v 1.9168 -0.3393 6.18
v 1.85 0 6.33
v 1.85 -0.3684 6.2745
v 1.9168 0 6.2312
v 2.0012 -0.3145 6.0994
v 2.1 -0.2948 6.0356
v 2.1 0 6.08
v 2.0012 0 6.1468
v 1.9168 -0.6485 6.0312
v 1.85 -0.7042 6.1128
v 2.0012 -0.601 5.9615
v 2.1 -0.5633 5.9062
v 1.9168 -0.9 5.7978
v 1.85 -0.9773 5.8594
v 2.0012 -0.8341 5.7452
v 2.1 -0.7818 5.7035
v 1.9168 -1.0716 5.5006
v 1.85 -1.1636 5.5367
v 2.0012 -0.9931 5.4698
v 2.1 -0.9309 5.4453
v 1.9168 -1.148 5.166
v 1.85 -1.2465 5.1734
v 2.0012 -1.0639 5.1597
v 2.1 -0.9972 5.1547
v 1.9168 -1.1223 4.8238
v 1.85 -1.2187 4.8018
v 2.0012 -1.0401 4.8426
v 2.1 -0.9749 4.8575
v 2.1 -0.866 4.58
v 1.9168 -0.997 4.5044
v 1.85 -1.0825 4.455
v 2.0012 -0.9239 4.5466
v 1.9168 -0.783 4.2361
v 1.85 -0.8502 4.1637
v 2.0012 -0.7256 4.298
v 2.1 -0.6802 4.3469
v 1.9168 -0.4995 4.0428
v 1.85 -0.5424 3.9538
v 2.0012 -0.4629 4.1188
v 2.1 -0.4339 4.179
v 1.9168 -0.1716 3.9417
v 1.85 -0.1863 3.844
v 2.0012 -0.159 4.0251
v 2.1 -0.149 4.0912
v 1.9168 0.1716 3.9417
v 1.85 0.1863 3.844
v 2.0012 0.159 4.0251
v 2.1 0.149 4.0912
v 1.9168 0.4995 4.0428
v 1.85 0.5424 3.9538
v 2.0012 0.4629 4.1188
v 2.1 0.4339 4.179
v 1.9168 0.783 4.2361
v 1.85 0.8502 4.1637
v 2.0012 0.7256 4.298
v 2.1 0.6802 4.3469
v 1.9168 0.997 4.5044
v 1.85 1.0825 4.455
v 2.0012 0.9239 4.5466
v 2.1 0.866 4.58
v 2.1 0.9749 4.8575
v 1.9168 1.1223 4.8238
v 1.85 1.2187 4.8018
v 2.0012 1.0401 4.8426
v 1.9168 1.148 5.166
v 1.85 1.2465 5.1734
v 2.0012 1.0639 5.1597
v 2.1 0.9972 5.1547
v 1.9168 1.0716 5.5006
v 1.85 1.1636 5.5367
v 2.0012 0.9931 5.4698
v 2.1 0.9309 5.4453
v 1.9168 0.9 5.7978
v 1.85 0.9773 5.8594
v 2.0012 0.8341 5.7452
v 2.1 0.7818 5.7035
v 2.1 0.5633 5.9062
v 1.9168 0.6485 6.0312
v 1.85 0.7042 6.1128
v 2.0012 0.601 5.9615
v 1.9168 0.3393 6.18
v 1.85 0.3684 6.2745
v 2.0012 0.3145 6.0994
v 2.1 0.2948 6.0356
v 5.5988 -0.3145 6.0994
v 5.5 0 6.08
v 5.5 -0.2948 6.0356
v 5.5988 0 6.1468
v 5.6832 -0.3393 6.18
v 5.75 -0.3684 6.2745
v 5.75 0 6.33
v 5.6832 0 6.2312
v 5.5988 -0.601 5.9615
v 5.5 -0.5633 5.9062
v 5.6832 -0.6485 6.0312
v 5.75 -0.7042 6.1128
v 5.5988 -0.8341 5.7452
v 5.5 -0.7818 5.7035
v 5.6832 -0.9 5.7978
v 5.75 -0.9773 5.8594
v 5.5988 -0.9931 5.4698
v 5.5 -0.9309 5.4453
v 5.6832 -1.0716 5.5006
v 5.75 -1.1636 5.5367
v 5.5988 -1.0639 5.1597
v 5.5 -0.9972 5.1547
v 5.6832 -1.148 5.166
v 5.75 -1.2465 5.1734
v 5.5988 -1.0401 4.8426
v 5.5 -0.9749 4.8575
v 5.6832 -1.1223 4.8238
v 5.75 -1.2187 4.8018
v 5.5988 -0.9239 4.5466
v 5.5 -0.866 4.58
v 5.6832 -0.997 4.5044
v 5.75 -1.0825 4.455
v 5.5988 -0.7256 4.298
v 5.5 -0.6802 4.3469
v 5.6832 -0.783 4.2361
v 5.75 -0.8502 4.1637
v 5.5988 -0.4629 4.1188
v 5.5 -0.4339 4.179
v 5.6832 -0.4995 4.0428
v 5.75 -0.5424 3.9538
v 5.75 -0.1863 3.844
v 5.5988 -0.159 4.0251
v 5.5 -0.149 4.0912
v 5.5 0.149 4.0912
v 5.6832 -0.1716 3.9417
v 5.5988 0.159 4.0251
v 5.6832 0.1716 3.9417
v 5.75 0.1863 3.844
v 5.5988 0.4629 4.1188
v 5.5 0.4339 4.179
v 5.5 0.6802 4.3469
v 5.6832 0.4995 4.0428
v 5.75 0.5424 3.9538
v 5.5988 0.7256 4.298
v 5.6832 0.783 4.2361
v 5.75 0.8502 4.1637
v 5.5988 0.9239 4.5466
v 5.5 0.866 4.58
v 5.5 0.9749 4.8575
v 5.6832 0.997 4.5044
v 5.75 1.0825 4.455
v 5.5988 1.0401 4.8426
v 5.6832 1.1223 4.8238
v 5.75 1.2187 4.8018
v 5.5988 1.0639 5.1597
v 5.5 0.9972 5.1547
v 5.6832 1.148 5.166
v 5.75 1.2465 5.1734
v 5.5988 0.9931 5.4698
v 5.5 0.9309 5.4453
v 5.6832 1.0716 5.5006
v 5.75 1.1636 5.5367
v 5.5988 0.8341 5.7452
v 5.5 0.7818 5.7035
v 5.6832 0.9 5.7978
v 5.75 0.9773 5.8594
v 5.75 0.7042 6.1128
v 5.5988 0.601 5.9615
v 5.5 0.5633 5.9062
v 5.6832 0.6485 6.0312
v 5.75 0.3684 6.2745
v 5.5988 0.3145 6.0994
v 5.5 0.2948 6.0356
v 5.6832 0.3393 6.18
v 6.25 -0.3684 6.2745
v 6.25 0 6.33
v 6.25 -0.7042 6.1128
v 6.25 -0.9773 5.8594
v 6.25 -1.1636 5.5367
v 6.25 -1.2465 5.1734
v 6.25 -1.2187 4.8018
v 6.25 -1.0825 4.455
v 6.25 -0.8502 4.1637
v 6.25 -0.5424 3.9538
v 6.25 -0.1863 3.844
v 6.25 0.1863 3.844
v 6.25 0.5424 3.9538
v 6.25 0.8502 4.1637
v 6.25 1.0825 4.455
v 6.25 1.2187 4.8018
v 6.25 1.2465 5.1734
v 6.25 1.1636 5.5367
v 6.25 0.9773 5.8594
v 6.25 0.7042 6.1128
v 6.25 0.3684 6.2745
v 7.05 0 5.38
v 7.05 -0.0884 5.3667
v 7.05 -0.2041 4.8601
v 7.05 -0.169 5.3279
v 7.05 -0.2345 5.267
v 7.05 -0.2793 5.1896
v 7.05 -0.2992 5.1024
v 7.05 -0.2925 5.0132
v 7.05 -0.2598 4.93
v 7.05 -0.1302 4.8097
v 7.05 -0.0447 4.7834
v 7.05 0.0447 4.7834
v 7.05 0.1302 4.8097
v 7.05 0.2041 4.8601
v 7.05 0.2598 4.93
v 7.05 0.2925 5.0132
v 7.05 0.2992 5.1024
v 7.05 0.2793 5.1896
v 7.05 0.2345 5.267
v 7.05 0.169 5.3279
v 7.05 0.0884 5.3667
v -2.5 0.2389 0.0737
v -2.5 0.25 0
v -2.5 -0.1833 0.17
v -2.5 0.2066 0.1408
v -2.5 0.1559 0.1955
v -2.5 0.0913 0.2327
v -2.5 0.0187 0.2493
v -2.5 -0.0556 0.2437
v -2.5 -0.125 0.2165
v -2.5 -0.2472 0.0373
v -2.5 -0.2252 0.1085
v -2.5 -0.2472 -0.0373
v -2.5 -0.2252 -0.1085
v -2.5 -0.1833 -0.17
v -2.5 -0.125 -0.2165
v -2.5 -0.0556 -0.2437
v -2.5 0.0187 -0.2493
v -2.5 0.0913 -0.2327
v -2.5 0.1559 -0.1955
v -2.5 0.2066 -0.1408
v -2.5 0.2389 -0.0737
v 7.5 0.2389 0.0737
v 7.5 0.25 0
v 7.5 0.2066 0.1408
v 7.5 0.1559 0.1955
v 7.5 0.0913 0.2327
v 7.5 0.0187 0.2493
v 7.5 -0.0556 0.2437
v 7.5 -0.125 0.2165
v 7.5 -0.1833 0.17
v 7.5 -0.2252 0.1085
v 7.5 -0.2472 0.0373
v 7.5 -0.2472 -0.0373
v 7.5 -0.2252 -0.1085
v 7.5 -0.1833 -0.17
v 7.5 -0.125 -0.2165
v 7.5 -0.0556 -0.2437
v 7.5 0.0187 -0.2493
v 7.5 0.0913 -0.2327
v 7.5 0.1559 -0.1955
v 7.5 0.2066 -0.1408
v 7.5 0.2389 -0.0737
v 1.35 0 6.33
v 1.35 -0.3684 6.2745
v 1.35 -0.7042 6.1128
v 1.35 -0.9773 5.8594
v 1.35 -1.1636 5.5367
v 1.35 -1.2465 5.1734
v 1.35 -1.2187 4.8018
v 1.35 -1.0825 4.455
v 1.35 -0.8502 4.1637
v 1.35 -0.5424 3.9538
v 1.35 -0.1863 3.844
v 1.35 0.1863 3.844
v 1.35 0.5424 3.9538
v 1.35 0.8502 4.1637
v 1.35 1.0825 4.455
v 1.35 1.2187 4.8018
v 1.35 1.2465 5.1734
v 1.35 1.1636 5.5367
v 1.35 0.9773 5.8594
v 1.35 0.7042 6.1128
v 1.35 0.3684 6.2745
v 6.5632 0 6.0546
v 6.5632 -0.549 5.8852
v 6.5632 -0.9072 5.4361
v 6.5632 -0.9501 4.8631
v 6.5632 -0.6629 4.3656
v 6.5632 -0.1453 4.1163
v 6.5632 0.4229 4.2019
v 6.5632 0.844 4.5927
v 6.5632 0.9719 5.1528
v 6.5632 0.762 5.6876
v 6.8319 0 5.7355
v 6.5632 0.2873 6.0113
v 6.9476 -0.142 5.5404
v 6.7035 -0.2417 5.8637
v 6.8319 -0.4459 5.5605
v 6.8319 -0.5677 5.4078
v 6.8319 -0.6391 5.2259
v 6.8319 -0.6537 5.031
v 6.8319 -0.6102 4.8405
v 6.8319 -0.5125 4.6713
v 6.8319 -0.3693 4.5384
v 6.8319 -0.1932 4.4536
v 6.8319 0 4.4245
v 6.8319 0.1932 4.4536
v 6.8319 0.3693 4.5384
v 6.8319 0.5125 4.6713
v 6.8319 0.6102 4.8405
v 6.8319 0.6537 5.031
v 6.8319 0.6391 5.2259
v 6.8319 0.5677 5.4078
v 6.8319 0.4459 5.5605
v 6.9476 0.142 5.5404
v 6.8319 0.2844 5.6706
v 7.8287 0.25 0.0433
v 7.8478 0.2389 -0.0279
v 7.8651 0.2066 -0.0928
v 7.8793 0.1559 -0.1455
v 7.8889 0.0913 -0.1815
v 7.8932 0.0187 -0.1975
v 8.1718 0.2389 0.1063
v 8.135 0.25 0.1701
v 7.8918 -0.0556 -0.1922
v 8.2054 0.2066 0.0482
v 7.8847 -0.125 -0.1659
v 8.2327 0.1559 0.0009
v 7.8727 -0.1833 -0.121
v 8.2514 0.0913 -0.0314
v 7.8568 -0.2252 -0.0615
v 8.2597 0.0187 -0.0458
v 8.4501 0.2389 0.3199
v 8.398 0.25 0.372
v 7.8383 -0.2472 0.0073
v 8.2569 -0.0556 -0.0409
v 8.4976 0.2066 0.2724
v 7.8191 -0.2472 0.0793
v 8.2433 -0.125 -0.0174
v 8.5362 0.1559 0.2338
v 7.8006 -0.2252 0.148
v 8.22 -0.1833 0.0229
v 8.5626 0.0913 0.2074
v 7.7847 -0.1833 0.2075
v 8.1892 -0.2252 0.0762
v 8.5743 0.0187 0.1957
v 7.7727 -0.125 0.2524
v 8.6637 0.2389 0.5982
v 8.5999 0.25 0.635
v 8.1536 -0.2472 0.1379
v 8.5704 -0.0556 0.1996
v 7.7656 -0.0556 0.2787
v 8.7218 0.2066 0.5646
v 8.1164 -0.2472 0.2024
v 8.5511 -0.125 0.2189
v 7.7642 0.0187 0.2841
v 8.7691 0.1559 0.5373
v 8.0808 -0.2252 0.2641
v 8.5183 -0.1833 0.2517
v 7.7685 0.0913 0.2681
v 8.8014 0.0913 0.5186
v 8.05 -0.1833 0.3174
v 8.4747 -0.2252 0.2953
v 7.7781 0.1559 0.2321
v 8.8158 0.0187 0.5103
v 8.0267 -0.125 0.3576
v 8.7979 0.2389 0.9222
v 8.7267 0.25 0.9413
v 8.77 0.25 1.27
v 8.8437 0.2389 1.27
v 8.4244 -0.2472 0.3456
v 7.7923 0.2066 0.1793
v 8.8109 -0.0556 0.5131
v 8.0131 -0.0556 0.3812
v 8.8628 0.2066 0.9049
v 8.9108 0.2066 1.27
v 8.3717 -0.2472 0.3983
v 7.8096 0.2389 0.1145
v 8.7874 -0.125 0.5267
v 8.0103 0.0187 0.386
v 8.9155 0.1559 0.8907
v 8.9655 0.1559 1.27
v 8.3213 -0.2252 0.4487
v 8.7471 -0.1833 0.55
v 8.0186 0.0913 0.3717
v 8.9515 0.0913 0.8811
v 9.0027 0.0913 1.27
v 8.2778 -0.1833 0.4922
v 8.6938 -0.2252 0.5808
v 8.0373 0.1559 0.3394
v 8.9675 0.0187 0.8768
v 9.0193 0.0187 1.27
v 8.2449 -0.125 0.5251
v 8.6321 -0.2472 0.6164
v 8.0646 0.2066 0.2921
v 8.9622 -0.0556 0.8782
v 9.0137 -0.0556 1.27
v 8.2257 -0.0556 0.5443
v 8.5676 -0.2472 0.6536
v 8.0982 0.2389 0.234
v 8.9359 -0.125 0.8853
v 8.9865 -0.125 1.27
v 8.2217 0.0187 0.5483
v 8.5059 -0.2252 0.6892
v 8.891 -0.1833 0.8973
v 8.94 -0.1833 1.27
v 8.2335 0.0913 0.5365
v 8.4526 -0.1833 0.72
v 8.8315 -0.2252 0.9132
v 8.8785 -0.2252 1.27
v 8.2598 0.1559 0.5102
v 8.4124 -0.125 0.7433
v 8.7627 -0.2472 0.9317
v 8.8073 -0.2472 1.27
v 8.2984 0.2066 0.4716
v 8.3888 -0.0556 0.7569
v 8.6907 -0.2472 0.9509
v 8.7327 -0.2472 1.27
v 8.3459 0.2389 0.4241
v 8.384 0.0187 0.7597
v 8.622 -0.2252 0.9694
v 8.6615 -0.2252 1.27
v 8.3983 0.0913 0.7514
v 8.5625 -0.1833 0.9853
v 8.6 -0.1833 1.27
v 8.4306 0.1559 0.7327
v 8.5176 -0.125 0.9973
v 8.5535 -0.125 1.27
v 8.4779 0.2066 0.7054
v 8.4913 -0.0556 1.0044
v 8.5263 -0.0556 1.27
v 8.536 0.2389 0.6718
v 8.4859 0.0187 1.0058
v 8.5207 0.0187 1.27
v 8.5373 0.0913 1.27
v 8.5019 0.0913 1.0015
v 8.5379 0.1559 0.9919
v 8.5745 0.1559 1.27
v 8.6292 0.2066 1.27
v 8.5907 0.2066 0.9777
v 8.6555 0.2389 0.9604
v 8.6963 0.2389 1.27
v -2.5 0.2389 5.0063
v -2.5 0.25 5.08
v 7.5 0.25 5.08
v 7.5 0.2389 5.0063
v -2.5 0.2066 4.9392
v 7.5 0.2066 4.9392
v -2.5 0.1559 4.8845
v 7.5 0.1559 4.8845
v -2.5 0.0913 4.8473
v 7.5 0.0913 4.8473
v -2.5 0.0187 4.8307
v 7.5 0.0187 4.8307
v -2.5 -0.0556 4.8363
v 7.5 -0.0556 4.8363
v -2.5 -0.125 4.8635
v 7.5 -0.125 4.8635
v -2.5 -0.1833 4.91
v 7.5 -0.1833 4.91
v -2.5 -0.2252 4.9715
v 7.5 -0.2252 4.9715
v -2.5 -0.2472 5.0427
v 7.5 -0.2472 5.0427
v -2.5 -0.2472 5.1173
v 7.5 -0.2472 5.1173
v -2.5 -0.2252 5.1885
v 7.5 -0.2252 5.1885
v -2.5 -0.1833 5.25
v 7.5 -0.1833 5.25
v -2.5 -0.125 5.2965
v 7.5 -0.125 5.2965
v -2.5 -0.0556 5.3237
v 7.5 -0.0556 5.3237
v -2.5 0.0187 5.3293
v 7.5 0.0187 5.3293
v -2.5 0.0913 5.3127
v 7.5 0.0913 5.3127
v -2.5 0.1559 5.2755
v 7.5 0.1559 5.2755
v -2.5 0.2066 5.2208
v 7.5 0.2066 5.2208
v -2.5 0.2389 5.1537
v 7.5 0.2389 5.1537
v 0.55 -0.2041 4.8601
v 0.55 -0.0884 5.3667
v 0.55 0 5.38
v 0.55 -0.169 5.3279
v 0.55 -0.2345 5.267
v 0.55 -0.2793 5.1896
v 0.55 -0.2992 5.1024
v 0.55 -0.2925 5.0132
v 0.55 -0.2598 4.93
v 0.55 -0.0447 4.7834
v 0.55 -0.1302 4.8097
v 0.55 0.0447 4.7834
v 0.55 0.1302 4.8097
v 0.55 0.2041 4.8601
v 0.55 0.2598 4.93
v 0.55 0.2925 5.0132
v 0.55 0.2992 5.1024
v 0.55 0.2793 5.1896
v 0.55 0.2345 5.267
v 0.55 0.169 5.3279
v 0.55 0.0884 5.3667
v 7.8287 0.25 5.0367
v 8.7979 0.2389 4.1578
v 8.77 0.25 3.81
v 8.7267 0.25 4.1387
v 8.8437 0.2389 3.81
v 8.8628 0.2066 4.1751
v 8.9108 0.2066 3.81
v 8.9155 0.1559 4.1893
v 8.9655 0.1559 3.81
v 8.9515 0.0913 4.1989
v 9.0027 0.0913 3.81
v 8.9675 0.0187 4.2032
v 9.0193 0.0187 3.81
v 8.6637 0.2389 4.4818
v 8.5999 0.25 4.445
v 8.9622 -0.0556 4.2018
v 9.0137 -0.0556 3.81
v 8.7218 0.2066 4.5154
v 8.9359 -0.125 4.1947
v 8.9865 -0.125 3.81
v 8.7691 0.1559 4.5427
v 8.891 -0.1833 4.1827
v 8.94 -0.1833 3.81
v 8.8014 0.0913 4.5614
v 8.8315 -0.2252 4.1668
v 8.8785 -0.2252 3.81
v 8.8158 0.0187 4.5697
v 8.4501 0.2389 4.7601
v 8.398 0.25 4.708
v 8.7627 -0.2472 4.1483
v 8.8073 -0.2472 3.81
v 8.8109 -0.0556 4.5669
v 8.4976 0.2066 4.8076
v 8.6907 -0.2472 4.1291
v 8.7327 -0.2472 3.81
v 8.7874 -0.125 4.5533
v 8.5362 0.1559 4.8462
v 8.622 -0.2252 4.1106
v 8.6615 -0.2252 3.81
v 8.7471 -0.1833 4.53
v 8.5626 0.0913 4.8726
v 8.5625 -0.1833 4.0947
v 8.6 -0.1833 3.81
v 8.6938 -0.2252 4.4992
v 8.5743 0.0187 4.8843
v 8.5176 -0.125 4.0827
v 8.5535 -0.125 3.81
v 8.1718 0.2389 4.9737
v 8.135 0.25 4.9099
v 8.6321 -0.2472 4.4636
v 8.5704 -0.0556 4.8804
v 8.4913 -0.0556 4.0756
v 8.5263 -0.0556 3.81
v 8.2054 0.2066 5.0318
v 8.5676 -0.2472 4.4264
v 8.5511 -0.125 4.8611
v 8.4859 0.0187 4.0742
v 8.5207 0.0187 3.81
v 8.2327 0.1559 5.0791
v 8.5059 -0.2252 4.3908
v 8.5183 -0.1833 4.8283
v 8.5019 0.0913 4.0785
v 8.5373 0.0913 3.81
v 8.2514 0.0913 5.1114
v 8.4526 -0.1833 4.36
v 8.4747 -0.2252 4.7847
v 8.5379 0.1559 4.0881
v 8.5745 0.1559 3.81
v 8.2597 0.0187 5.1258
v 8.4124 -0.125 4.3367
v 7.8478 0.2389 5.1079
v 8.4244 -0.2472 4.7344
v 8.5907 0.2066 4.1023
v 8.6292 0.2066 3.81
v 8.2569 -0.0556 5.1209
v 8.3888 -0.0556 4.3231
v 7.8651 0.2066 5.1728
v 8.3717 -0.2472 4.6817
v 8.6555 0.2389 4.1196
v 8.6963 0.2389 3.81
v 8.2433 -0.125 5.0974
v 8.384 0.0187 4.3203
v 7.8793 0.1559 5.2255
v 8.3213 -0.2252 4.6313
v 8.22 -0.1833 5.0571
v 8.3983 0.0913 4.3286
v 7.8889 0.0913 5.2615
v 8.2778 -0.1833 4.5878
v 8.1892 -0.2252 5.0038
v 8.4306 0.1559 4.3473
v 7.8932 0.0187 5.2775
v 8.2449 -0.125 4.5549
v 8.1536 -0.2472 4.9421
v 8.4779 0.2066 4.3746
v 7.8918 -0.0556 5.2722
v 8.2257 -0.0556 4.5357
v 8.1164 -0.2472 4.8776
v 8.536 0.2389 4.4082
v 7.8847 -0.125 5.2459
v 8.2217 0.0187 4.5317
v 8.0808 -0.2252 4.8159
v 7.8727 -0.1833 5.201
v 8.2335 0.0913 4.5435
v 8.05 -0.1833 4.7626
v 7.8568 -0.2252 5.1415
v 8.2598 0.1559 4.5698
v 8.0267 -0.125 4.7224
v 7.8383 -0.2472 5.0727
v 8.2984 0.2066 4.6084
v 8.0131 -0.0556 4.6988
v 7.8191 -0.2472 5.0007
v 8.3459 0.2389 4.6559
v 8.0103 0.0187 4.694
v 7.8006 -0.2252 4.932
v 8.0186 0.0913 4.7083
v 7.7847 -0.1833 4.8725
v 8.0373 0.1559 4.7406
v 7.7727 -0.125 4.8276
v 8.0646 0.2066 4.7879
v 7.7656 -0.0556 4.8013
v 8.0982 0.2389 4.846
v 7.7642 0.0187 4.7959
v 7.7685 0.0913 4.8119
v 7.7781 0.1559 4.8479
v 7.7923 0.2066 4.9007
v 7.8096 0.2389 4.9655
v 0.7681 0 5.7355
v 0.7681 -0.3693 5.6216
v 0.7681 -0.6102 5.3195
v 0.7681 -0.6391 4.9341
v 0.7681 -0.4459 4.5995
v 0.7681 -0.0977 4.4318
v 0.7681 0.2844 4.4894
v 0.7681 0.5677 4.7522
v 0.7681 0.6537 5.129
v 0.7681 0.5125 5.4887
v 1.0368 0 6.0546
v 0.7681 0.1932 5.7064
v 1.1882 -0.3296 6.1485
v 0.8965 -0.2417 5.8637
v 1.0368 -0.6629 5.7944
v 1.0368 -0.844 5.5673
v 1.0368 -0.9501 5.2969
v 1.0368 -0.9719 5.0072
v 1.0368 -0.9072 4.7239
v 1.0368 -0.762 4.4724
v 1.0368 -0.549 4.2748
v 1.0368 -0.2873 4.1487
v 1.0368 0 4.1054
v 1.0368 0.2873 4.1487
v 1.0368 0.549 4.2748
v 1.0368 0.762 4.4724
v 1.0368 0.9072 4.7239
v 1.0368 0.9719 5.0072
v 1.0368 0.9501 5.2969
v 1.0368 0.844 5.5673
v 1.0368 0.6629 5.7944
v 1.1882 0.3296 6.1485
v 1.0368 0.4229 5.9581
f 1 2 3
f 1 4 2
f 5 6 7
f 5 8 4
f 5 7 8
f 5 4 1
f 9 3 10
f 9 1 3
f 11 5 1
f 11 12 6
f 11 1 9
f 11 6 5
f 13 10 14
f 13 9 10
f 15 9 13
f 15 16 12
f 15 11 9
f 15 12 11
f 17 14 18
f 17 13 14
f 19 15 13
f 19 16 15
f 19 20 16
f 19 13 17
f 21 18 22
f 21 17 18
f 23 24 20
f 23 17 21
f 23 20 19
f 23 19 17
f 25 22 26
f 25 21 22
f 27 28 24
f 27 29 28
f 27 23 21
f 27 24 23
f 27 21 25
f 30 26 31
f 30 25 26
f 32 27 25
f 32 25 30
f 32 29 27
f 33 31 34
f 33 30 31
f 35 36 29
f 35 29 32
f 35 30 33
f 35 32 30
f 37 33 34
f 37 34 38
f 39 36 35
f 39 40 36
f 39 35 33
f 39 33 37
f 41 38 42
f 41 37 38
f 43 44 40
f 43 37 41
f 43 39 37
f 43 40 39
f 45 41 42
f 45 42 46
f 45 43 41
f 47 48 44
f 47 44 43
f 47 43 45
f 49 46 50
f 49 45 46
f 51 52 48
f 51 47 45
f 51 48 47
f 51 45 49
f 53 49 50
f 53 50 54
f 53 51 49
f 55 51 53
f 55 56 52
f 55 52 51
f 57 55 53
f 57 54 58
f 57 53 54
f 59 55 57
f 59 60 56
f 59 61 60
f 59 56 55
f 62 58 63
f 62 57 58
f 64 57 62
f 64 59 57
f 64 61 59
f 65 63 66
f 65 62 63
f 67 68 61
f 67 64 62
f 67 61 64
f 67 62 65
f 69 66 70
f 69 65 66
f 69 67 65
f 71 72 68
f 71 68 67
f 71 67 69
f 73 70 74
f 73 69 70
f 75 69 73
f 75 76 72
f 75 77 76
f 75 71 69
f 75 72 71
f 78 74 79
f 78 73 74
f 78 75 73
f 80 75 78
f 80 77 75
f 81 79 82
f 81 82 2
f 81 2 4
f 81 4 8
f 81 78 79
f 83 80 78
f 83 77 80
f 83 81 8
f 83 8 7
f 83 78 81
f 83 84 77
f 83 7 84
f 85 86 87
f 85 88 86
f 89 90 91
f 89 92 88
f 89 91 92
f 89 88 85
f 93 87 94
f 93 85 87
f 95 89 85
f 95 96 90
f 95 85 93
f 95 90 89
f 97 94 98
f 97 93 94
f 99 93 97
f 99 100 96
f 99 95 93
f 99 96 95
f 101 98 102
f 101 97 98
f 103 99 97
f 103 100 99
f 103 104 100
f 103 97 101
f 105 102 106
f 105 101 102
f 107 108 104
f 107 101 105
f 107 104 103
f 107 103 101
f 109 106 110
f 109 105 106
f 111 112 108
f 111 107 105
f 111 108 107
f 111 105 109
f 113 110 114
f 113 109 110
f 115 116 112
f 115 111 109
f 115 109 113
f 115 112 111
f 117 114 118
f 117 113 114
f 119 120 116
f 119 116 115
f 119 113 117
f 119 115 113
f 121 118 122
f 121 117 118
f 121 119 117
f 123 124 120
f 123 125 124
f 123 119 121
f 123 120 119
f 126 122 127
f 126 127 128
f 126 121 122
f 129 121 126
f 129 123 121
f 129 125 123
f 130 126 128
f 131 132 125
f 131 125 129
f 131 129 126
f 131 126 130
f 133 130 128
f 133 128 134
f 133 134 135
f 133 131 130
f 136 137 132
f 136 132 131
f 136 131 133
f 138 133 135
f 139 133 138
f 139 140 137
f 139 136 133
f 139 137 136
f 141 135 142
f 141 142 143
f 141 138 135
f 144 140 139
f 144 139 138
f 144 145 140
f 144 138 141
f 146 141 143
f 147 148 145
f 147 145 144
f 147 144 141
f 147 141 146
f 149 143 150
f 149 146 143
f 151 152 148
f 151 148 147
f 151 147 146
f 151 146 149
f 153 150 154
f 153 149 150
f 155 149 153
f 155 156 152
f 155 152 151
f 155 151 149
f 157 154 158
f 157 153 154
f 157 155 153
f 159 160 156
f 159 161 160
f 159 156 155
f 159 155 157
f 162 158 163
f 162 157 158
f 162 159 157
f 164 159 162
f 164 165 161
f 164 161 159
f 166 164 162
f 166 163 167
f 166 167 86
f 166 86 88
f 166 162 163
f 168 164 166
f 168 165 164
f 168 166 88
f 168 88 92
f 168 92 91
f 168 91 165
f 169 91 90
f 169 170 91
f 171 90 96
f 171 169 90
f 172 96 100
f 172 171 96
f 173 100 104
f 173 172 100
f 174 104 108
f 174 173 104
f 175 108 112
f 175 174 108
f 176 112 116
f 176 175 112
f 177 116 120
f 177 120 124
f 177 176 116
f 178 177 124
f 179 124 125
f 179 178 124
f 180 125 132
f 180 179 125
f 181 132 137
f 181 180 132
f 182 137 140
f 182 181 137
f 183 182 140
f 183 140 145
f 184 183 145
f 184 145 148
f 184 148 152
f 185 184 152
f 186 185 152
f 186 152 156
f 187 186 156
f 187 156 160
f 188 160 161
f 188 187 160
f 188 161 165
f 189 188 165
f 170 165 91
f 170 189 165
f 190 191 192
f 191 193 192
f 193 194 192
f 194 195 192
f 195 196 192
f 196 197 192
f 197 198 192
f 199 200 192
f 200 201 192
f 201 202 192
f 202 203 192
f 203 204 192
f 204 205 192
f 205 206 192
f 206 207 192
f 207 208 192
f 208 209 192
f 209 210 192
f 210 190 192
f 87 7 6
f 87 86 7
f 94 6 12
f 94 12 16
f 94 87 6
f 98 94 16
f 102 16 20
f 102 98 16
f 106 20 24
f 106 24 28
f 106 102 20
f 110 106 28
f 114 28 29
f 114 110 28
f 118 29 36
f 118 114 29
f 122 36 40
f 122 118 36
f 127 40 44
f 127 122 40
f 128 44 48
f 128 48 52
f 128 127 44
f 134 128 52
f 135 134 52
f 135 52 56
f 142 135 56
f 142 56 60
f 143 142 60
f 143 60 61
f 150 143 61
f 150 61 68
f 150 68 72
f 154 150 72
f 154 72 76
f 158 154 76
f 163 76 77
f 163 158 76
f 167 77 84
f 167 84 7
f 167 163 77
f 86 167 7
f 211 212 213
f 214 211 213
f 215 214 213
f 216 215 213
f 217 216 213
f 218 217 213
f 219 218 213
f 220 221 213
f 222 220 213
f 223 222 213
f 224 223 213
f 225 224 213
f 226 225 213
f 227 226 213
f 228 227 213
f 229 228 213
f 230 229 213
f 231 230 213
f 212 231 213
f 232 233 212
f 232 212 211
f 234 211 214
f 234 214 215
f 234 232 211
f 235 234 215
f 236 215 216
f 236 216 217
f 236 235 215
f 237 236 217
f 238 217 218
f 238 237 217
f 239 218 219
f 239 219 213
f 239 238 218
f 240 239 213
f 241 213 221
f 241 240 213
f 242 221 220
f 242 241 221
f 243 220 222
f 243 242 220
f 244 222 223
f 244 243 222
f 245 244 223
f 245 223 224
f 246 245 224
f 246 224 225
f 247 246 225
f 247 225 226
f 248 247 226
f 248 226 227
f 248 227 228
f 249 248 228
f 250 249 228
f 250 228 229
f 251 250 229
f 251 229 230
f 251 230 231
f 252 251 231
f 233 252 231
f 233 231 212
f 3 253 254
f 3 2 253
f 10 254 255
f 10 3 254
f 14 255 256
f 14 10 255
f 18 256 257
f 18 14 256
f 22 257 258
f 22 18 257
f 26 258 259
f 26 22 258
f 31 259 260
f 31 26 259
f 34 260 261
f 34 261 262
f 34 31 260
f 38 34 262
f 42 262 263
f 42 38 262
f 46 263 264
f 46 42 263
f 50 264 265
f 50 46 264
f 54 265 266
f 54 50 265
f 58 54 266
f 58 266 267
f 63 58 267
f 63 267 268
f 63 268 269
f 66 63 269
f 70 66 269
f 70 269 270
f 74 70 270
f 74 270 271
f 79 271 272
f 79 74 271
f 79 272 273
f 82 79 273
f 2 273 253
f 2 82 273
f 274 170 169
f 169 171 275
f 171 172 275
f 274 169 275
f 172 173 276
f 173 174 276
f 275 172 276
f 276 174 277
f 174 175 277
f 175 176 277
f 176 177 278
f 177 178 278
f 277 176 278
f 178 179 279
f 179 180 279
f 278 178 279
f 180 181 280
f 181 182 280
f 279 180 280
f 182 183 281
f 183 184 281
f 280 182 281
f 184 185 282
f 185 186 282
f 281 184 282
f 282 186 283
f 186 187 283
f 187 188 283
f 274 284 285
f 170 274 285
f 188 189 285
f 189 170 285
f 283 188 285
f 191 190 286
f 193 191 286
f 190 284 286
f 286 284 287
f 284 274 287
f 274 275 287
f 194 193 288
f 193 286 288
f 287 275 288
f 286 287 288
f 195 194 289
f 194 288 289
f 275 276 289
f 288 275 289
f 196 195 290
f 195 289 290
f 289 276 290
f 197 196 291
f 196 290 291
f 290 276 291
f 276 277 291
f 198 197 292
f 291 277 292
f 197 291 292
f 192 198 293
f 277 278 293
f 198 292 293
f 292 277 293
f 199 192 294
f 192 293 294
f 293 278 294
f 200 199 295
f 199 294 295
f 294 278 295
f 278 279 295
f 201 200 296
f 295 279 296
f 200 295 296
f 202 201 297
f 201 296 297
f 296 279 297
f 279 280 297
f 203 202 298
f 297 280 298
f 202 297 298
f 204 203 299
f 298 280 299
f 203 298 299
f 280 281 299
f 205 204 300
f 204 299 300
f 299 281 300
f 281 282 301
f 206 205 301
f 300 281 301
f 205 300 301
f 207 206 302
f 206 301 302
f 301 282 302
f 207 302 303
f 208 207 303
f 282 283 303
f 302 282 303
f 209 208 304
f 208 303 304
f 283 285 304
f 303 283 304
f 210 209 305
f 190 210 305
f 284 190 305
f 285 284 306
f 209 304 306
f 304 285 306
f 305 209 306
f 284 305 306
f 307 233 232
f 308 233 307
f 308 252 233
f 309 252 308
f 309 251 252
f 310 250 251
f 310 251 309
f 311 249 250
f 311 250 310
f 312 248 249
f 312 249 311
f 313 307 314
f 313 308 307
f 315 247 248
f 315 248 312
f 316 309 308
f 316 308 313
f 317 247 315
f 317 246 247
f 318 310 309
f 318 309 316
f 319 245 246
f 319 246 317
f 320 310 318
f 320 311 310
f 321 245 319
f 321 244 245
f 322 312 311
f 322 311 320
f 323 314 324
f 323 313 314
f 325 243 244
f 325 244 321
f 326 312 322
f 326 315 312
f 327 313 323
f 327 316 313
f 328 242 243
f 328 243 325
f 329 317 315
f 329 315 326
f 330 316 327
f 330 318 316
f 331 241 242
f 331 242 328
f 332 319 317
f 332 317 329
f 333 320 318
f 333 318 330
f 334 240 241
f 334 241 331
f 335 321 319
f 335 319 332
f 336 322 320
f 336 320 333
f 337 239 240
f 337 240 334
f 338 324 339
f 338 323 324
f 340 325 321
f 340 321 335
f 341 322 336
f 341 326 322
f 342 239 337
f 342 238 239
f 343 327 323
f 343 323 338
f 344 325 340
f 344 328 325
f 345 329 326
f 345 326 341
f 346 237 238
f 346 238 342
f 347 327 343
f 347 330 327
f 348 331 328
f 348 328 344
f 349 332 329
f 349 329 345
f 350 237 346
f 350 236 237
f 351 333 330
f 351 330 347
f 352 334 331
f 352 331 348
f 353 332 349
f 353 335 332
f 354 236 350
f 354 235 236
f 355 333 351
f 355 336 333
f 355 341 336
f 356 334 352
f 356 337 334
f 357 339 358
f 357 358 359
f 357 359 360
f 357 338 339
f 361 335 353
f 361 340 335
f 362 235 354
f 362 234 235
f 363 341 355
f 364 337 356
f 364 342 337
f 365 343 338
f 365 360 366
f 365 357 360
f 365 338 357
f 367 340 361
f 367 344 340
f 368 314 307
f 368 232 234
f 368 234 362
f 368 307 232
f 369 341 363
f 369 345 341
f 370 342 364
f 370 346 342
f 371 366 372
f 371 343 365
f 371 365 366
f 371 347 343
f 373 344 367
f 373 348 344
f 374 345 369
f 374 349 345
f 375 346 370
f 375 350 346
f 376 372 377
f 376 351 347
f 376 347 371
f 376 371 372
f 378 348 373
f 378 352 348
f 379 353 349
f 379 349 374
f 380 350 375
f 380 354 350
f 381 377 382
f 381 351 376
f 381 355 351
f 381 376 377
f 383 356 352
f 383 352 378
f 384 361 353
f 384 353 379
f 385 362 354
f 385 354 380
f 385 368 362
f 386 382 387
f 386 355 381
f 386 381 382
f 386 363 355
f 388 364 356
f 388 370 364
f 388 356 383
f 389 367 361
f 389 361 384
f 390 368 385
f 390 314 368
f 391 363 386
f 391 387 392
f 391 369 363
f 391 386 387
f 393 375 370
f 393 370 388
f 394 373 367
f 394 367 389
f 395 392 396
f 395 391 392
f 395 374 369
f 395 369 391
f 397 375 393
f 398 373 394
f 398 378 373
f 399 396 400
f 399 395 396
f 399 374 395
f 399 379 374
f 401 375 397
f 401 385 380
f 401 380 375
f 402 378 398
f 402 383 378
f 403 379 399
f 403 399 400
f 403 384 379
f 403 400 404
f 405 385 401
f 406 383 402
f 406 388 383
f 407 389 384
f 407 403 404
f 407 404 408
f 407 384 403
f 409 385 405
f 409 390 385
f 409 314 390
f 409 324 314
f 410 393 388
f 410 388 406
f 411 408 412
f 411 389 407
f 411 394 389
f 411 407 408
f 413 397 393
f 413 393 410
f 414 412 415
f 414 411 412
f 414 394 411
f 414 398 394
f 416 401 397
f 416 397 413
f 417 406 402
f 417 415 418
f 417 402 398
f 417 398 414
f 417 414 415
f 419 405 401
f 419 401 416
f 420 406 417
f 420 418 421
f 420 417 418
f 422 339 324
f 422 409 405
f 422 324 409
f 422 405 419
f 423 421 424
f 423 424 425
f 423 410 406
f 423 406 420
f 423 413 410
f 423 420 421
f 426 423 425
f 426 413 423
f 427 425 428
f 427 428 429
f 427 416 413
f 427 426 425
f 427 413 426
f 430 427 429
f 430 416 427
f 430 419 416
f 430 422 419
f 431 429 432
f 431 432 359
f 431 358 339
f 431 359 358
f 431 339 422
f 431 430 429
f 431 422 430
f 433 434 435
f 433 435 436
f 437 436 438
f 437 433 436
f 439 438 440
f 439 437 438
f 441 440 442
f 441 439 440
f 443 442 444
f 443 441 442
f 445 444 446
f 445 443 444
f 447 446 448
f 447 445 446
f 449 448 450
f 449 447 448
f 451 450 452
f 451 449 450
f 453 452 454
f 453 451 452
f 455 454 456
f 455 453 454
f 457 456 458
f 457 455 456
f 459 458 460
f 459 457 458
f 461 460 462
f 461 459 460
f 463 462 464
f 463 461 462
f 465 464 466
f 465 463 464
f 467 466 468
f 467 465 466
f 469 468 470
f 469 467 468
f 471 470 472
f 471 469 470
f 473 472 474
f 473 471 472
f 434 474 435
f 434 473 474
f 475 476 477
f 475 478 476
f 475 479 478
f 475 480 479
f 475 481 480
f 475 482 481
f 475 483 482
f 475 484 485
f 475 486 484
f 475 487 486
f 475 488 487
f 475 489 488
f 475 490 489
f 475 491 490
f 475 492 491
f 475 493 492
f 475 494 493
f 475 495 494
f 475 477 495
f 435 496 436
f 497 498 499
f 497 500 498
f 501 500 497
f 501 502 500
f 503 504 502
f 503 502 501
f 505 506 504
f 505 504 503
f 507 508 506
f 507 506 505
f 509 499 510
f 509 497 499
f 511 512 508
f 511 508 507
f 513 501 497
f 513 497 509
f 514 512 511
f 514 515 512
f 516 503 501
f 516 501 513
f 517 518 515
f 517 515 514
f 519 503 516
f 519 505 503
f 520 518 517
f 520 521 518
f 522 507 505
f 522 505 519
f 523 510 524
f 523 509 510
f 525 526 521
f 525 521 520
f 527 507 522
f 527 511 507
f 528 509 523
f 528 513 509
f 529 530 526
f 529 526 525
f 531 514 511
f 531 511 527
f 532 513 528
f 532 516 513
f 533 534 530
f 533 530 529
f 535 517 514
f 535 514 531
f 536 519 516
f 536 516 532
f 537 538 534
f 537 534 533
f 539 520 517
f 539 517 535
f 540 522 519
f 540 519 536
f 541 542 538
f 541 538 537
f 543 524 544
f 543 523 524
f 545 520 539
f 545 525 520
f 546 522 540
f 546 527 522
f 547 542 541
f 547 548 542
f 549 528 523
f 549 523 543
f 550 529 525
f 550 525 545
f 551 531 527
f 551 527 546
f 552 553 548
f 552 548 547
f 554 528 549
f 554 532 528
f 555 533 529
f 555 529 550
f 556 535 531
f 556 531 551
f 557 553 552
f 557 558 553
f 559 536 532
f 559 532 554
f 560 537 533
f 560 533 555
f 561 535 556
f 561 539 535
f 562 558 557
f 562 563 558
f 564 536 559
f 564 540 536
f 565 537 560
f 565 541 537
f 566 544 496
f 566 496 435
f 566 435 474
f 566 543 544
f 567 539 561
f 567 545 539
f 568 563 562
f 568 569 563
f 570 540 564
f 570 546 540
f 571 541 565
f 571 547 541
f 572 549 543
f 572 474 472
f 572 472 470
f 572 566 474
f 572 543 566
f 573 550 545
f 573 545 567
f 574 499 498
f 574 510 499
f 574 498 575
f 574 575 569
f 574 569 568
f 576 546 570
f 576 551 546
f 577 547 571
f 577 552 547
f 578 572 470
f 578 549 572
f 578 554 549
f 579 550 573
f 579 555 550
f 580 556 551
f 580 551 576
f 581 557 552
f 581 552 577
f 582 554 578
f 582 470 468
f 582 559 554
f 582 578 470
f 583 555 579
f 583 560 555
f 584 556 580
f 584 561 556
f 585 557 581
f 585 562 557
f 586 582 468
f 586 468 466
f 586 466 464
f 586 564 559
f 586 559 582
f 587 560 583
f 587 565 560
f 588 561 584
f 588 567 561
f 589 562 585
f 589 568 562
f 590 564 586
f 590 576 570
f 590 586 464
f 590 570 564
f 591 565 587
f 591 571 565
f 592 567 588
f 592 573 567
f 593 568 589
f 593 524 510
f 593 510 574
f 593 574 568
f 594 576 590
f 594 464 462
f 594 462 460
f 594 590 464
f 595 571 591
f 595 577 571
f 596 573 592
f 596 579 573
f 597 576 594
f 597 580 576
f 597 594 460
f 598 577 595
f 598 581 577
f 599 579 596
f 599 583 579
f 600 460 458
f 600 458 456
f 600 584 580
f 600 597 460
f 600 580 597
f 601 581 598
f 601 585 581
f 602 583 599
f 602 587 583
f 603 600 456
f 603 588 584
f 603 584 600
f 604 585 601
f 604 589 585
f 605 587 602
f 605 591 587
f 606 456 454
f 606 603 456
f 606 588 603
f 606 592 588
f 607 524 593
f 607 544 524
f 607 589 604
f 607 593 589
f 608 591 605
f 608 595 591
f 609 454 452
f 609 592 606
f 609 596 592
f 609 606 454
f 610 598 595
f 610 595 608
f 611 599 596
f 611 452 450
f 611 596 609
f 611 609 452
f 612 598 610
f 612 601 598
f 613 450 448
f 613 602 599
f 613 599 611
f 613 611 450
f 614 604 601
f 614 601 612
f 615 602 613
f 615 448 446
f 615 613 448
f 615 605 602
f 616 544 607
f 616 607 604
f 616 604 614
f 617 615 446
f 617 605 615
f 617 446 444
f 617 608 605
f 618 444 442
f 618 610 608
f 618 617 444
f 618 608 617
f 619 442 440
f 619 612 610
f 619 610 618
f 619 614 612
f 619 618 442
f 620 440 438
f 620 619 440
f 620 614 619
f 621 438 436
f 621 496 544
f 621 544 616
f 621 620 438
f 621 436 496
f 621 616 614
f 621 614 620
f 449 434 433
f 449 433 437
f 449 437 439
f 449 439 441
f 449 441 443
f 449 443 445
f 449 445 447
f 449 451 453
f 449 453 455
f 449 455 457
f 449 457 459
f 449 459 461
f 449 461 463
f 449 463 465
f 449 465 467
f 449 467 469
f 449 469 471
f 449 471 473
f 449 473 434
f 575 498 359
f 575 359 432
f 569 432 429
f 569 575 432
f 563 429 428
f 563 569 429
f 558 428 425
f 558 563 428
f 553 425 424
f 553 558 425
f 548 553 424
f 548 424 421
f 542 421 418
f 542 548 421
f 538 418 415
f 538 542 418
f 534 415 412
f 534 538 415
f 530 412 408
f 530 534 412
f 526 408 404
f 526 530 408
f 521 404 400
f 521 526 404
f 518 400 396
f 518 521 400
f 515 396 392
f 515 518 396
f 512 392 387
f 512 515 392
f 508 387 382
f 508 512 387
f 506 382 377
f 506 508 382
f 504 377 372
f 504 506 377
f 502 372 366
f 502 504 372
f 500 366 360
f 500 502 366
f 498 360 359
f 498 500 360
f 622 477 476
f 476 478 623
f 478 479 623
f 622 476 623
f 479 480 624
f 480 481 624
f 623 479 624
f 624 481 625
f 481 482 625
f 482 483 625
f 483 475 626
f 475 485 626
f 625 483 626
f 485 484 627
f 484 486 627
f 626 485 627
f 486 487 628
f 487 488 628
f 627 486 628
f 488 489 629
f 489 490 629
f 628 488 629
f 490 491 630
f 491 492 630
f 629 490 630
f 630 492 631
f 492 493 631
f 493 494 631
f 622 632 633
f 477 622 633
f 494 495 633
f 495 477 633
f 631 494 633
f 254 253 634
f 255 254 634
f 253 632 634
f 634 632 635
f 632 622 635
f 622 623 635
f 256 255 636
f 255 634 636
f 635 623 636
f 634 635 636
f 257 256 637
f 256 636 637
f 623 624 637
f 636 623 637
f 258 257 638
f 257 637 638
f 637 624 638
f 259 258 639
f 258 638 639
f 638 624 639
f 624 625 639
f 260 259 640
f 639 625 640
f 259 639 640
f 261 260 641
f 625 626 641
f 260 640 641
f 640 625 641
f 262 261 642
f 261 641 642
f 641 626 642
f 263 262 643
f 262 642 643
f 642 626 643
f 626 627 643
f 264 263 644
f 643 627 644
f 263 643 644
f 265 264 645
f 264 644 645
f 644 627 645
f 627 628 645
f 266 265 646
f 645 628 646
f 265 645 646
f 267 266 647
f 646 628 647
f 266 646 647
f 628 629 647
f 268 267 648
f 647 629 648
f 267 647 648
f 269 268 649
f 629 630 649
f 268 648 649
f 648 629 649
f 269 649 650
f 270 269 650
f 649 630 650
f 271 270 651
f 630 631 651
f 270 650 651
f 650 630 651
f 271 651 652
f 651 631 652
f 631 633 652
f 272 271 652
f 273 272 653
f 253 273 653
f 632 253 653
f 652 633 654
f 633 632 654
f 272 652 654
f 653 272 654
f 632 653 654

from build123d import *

# Parameters (mm, degrees)
SKETCH_R = 0.25


with BuildPart() as revolution:
    # Sketch002 → Revolution (revolve)
    with BuildSketch(Plane.XZ):
        with BuildLine():
            Line((1.35, 6.33), (1.85, 6.33))
            ThreePointArc((1.85, 6.33), (1.956999, 6.186999), (2.1, 6.08))
            Line((2.1, 6.08), (5.5, 6.08))
            ThreePointArc((5.5, 6.08), (5.643001, 6.186999), (5.75, 6.33))
            Line((5.75, 6.33), (6.25, 6.33))
            ThreePointArc((7.05, 5.38), (6.703542, 5.900088), (6.25, 6.33))
            Line((7.05, 5.08), (7.05, 5.38))
            Line((0.55, 5.08), (7.05, 5.08))
            Line((0.55, 5.08), (0.55, 5.38))
            ThreePointArc((1.35, 6.33), (0.896458, 5.900088), (0.55, 5.38))
        make_face()
    revolve(axis=Axis((0.55, 0, 5.08), (1, 0, 0)))


with BuildPart() as sweep_body:
    # Sweep: sweep along a path in Sketch001
    with BuildLine(Plane.XZ) as sweep_path:
        Line((-2.5, 0), (7.5, 0))
        ThreePointArc((7.5, 0), (8.398026, 0.371974), (8.77, 1.27))
        Line((8.77, 1.27), (8.77, 3.81))
        ThreePointArc((8.77, 3.81), (8.398026, 4.708026), (7.5, 5.08))
        Line((7.5, 5.08), (-2.5, 5.08))
    # Sketch → Sweep (sweep)
    with BuildSketch(Plane.YZ.offset(-2.5)):
        Circle(SKETCH_R)
    sweep(path=sweep_path.line, is_frenet=True)


solid = Compound([revolution.part, sweep_body.part])
